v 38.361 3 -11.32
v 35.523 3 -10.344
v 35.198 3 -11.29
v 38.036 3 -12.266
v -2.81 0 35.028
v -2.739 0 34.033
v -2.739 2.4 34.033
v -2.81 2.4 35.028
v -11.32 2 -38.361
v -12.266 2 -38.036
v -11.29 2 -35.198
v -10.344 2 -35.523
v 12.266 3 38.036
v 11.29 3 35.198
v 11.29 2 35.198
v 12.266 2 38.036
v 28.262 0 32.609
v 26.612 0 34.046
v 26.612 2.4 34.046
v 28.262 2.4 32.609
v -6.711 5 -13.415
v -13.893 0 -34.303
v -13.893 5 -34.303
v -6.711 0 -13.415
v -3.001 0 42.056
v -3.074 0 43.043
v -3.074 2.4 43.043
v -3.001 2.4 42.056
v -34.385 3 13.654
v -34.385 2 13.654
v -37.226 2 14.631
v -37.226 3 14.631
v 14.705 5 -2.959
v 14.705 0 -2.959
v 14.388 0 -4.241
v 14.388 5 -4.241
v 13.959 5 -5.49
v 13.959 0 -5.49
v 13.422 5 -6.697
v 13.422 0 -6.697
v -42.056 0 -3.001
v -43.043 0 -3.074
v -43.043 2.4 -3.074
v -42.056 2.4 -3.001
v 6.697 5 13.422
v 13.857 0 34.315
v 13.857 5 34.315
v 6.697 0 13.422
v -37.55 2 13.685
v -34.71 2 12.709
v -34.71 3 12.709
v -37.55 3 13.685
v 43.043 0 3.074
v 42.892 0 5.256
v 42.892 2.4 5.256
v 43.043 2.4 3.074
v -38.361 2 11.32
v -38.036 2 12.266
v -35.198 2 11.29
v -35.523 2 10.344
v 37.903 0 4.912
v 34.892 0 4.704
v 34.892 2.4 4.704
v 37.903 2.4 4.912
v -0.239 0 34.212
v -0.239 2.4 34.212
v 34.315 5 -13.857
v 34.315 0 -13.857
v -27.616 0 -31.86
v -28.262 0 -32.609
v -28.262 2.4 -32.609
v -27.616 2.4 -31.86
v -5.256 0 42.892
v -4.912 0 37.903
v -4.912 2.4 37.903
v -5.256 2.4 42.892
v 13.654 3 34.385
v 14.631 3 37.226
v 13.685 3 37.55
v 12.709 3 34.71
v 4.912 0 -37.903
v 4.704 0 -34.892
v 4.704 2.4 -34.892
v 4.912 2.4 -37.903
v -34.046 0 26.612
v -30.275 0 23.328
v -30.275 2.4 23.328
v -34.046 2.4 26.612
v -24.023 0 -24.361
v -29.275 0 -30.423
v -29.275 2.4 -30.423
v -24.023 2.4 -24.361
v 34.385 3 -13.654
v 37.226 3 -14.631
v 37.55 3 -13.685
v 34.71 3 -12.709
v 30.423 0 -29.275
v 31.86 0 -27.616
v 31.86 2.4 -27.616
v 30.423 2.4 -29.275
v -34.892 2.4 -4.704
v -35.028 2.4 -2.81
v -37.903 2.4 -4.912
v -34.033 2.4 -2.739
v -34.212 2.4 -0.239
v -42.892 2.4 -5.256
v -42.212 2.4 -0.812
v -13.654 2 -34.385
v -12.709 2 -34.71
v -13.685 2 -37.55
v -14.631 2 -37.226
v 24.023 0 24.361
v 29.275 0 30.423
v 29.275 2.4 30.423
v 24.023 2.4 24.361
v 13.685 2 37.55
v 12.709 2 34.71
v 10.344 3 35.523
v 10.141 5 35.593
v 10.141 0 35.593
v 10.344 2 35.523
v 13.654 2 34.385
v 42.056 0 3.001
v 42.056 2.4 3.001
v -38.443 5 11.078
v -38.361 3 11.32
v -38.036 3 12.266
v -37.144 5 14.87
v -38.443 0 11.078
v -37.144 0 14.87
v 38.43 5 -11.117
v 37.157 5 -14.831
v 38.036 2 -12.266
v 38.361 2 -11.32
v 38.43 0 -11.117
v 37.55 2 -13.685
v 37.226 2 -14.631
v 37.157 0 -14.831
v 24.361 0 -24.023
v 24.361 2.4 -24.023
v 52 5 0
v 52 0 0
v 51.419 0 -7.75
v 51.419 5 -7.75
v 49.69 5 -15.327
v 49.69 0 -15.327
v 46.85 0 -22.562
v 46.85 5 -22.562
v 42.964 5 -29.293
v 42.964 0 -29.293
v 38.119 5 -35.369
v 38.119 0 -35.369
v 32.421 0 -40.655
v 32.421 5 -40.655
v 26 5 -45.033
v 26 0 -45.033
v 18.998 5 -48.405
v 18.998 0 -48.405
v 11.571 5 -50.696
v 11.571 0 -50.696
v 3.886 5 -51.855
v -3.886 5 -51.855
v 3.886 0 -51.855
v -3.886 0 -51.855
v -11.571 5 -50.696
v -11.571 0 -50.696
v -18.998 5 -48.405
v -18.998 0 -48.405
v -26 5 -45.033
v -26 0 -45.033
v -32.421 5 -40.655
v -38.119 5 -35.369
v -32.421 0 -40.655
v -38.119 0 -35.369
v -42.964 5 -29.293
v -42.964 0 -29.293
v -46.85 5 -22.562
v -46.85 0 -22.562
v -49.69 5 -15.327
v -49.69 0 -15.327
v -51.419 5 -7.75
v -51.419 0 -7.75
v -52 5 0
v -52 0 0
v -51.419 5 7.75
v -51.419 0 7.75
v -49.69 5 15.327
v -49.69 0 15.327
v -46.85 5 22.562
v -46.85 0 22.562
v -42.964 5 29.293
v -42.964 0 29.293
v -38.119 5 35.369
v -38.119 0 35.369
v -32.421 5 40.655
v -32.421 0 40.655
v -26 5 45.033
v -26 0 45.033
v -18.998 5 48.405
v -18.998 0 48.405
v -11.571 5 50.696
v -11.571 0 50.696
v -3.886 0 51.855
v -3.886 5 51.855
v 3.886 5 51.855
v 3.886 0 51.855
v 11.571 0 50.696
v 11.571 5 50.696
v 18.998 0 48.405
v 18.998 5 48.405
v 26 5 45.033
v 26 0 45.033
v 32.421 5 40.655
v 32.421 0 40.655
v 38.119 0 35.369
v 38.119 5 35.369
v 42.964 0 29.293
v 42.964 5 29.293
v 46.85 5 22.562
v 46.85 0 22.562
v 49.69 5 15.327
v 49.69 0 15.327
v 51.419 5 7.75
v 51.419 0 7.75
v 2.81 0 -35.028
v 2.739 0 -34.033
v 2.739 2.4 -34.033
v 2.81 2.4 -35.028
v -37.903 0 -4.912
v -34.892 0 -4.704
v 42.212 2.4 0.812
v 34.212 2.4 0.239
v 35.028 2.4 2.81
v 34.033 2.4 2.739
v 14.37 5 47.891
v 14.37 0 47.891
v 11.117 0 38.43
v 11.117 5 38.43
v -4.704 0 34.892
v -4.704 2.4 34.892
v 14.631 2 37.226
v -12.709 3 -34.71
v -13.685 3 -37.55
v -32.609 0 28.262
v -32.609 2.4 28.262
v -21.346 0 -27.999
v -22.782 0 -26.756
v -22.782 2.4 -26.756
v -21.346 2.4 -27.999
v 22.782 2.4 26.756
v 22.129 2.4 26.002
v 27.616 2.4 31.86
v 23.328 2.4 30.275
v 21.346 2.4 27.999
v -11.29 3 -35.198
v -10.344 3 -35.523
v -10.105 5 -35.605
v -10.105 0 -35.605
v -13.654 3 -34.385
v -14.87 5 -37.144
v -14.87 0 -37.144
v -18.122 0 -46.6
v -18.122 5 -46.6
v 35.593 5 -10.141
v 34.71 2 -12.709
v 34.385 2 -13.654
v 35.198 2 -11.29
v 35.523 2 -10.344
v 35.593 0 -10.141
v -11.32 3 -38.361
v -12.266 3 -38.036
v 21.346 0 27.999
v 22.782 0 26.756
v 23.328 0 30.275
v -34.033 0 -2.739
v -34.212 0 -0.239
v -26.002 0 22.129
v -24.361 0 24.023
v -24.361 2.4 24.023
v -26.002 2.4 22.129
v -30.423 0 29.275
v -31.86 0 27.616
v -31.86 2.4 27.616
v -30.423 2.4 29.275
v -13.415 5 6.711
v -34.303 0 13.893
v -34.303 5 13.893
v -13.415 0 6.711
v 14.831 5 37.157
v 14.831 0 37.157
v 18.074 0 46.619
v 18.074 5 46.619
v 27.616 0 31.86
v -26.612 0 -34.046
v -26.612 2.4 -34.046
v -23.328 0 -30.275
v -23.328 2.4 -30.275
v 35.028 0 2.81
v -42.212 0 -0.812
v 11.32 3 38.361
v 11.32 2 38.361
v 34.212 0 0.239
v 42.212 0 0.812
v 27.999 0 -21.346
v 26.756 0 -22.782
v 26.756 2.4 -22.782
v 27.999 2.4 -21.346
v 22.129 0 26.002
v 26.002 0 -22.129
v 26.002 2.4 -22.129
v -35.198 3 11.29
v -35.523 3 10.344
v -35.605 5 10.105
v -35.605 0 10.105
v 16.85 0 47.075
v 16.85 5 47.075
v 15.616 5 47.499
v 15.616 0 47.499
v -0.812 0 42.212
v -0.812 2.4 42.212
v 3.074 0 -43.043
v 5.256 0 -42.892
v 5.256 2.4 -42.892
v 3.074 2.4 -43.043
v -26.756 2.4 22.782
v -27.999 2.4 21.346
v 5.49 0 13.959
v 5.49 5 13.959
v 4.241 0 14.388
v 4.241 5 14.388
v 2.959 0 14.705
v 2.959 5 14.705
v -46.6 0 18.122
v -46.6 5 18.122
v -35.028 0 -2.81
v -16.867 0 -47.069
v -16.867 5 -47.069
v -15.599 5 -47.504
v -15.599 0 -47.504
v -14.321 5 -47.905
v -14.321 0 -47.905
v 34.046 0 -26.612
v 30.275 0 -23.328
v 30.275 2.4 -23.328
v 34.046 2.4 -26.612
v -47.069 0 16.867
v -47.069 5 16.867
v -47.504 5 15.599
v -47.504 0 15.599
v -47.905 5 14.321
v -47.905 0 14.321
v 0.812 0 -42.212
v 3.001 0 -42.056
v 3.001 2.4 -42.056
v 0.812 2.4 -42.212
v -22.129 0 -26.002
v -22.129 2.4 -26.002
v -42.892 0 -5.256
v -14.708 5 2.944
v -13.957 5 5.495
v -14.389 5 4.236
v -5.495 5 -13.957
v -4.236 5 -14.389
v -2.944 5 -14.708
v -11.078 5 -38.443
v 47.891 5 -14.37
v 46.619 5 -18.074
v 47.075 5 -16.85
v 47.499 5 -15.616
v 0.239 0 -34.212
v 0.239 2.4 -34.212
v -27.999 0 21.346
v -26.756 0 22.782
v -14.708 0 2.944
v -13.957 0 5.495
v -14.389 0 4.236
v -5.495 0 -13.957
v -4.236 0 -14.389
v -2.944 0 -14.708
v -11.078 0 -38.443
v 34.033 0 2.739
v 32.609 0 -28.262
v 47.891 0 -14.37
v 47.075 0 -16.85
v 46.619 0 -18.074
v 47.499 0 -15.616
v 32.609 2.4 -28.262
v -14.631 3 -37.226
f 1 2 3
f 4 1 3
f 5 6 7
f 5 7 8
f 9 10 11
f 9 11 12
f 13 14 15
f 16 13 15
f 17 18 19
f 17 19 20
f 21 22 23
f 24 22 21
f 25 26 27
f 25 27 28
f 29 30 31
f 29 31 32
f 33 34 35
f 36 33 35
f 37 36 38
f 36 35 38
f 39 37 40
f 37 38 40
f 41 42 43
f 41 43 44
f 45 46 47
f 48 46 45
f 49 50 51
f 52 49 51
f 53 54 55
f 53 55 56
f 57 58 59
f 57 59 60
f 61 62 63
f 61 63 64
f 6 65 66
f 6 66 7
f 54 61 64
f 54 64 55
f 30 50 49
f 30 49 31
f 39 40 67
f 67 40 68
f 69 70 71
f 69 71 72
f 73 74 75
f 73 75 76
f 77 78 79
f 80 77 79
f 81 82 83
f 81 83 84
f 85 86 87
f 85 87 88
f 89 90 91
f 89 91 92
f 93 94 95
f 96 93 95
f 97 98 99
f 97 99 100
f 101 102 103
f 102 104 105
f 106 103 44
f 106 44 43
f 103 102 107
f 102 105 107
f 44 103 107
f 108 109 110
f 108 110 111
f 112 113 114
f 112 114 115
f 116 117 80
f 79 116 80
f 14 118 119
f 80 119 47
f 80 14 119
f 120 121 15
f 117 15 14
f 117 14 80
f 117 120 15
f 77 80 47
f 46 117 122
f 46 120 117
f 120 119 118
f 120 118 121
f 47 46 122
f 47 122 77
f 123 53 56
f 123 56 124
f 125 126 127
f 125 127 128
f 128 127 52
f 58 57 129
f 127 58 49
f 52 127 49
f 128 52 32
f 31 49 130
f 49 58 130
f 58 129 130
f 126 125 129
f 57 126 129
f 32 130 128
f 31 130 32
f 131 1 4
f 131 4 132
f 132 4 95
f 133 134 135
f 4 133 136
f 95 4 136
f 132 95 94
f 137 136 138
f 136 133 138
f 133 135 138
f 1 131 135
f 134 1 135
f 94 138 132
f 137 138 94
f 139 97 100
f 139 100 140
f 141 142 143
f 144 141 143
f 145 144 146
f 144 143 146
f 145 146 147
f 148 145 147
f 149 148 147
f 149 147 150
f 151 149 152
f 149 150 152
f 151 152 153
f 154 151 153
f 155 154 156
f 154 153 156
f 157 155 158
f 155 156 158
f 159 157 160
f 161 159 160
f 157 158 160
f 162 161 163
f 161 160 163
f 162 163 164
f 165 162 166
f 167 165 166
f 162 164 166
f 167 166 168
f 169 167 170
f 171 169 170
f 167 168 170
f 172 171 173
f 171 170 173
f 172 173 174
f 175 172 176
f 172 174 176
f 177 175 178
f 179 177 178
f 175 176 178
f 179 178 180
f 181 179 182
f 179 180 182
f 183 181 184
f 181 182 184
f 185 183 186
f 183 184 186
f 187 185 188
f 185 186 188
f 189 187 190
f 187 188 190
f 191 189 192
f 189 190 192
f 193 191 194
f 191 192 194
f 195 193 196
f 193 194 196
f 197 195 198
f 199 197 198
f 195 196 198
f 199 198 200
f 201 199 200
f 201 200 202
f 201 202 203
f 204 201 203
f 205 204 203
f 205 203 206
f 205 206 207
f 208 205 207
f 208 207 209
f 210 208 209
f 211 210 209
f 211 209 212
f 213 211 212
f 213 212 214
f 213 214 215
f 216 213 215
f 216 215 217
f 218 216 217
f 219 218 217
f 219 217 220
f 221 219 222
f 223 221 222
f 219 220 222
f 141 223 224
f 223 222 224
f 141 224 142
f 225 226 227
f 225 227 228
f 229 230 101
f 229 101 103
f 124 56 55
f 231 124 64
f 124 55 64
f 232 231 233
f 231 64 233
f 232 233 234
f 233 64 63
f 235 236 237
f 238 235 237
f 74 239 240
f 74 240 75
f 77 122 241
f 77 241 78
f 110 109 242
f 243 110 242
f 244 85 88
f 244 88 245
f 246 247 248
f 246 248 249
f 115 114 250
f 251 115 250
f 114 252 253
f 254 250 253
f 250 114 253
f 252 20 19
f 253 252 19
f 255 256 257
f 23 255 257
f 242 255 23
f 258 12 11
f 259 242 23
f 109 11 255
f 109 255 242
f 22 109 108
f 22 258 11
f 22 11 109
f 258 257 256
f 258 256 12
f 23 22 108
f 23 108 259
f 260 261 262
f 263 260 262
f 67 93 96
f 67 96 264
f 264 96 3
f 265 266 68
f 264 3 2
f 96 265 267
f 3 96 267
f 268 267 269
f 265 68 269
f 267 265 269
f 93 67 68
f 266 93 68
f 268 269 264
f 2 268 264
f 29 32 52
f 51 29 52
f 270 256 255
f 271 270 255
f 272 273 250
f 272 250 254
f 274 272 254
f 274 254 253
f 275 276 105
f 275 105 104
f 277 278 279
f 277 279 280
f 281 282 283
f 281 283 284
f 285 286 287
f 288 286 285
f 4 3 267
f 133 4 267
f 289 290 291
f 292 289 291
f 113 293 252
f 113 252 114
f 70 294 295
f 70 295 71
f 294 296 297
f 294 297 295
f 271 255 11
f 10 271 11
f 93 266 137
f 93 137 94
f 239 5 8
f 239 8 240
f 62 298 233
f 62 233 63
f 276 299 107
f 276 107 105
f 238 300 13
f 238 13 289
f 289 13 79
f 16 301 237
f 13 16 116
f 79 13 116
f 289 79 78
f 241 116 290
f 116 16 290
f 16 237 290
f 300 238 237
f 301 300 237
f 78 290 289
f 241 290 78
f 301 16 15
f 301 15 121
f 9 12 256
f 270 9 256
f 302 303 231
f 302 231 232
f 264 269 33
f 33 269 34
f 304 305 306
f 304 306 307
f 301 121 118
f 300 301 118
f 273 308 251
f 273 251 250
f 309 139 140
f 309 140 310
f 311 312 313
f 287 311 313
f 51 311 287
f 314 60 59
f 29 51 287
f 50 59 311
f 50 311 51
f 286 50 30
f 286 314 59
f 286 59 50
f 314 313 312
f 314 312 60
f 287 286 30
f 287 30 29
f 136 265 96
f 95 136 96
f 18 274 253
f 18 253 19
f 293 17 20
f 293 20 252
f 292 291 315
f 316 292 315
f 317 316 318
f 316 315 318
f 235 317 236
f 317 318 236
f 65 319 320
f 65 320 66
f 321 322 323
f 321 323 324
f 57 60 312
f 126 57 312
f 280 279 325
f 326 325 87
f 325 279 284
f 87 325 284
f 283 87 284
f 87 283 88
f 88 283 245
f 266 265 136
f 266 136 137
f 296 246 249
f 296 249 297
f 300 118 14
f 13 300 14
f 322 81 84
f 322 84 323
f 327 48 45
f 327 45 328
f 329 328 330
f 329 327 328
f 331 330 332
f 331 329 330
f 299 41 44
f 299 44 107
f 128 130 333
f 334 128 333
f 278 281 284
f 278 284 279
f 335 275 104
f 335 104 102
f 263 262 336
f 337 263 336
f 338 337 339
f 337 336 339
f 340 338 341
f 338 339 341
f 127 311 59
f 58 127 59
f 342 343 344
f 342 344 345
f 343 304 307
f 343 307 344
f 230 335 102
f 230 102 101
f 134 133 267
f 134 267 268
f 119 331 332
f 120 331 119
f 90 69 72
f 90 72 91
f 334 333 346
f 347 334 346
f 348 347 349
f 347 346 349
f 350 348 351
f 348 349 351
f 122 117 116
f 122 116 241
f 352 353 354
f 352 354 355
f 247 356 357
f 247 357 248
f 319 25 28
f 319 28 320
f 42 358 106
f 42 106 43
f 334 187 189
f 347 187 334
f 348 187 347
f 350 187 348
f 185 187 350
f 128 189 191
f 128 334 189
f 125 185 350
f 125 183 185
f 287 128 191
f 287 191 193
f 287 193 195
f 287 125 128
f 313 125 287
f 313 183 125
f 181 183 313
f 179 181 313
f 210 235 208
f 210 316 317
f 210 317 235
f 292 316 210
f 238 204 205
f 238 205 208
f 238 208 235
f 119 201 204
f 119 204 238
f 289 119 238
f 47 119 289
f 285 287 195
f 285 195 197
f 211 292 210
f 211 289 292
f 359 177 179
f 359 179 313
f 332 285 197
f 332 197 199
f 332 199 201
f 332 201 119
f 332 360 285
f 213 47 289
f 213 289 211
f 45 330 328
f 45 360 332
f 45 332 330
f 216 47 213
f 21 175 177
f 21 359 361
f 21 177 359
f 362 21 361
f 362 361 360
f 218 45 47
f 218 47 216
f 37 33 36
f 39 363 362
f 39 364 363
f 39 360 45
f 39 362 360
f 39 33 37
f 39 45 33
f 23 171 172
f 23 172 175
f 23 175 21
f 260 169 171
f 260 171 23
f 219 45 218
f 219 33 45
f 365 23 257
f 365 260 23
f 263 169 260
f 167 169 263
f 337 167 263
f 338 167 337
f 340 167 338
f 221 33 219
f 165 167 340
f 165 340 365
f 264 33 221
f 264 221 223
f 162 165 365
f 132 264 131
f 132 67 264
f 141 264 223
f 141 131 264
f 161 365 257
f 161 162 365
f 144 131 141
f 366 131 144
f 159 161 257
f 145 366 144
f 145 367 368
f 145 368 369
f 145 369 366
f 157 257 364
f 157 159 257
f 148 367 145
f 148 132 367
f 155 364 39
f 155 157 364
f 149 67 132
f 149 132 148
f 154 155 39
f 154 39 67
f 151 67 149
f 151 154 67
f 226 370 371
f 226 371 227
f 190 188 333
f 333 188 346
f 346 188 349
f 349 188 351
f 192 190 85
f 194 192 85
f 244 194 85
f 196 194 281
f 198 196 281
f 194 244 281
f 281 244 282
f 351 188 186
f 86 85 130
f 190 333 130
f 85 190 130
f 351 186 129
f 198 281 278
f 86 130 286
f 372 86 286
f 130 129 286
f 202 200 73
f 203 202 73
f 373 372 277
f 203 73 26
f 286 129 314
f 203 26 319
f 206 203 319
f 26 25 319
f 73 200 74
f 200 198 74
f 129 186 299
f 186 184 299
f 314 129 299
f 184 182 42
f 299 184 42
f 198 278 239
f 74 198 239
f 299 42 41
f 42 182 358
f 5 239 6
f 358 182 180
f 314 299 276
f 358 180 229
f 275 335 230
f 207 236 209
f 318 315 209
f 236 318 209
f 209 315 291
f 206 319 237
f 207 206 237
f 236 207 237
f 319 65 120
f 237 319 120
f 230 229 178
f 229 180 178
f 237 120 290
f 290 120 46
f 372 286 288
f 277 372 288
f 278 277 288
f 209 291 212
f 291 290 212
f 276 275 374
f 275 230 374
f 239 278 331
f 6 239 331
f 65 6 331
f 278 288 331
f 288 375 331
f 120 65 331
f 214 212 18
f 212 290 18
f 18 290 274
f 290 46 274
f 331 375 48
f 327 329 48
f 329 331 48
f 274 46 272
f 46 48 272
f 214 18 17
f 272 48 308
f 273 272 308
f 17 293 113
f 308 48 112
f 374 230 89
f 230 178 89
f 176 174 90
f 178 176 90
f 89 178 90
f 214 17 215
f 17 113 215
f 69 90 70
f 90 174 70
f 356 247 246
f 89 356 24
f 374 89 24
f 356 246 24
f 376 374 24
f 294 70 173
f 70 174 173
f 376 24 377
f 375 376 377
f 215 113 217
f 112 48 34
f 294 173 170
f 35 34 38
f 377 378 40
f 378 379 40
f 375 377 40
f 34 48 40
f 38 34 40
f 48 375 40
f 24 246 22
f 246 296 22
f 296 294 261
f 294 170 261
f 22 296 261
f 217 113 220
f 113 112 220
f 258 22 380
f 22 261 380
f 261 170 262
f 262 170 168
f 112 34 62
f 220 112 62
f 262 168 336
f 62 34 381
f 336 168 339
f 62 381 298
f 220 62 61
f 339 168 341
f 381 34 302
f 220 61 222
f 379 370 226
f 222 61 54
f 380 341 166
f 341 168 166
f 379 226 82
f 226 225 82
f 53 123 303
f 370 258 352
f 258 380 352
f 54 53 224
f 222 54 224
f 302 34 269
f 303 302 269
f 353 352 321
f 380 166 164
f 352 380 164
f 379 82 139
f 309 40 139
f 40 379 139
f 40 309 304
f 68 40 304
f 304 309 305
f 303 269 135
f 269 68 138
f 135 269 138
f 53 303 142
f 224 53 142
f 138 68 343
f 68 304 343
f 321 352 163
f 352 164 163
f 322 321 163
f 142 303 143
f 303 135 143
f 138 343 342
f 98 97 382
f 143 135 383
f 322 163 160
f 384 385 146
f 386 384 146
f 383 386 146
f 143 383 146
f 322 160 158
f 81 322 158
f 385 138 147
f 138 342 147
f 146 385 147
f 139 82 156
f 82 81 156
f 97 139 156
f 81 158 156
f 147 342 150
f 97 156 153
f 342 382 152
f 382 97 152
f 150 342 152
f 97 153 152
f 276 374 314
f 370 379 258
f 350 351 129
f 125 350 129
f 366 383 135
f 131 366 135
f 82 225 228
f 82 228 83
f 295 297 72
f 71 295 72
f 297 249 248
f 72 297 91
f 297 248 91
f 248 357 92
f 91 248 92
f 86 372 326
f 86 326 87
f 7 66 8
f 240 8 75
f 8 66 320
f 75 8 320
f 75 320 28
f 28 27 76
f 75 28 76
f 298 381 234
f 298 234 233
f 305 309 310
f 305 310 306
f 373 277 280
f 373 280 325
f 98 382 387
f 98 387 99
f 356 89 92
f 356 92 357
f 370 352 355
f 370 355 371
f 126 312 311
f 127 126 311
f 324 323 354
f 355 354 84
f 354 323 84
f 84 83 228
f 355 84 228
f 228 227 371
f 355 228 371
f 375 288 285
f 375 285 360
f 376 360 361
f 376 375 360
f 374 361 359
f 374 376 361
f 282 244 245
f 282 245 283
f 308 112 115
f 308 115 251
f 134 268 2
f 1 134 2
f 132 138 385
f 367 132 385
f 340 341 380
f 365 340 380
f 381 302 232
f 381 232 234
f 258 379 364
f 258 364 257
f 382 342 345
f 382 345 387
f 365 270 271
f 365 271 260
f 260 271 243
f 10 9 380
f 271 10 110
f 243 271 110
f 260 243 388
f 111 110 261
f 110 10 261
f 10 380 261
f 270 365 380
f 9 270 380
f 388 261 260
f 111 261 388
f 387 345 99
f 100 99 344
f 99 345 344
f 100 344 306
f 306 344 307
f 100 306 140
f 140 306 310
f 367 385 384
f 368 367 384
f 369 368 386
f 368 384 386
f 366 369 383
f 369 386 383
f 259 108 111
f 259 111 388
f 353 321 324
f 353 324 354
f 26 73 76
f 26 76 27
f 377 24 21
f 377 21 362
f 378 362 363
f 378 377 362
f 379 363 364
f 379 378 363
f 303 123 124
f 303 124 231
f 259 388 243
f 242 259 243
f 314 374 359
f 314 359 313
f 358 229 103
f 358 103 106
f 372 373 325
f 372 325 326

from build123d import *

# Parameters (mm, degrees)
SKETCH1_R           = 52
BOSS_EXTRUDE1_DEPTH = 5
CUT_EXTRUDE3_DEPTH  = 2.4
CUT_EXTRUDE6_DEPTH  = 5
CUT_EXTRUDE7_DEPTH  = 5
CIRPATTERN1_COUNT   = 4


with BuildPart() as part:
    # Sketch1 → Boss-Extrude1 (new body)
    with BuildSketch(Plane(origin=(0, 0, 0), x_dir=(1, 0, 0), z_dir=(0, 1, 0))):
        Circle(SKETCH1_R)
    extrude(amount=BOSS_EXTRUDE1_DEPTH)

    # Sketch4 → Cut-Extrude3 (cut)
    with BuildSketch(Plane.XZ):
        Polygon((-30.27517129, 23.328400706), (-34.046075388, 26.612474905), (-32.609483493, 28.262026633), (-31.859987156, 27.61559837), (-30.422563818, 29.274773748), (-24.360613821, 24.023015245), (-26.001788353, 22.128655871), (-26.755565092, 22.781688872), (-27.999168756, 21.346233829), align=None)
        Polygon((-37.903449254, -4.912108587), (-42.892072249, -5.256349311), (-43.042657591, -3.074116227), (-42.05558984, -3.001236093), (-42.212392211, -0.811610142), (-34.212392211, -0.238718243), (-34.033363493, -2.738718243), (-35.028128199, -2.809954823), (-34.892468788, -4.704335401), align=None)
        Polygon((-4.912108587, 37.903449254), (-5.256349311, 42.892072249), (-3.074116227, 43.042657591), (-3.001236093, 42.05558984), (-0.811610142, 42.212392211), (-0.238718243, 34.212392211), (-2.738718243, 34.033363493), (-2.809954823, 35.028128199), (-4.704335401, 34.892468788), align=None)
        Polygon((23.328400706, 30.27517129), (26.612474905, 34.046075388), (28.262026633, 32.609483493), (27.61559837, 31.859987156), (29.274773748, 30.422563818), (24.023015245, 24.360613821), (22.128655871, 26.001788353), (22.781688872, 26.755565092), (21.346233829, 27.999168756), align=None)
        Polygon((37.903449254, 4.912108587), (42.892072249, 5.256349311), (43.042657591, 3.074116227), (42.05558984, 3.001236093), (42.212392211, 0.811610142), (34.212392211, 0.238718243), (34.033363493, 2.738718243), (35.028128199, 2.809954823), (34.892468788, 4.704335401), align=None)
        Polygon((30.27517129, -23.328400706), (34.046075388, -26.612474905), (32.609483493, -28.262026633), (31.859987156, -27.61559837), (30.422563818, -29.274773748), (24.360613821, -24.023015245), (26.001788353, -22.128655871), (26.755565092, -22.781688872), (27.999168756, -21.346233829), align=None)
        Polygon((4.912108587, -37.903449254), (5.256349311, -42.892072249), (3.074116227, -43.042657591), (3.001236093, -42.05558984), (0.811610142, -42.212392211), (0.238718243, -34.212392211), (2.738718243, -34.033363493), (2.809954823, -35.028128199), (4.704335401, -34.892468788), align=None)
        Polygon((-23.328400706, -30.27517129), (-26.612474905, -34.046075388), (-28.262026633, -32.609483493), (-27.61559837, -31.859987156), (-29.274773748, -30.422563818), (-24.023015245, -24.360613821), (-22.128655871, -26.001788353), (-22.781688872, -26.755565092), (-21.346233829, -27.999168756), align=None)
    extrude(amount=-CUT_EXTRUDE3_DEPTH, mode=Mode.SUBTRACT)

    # Sketch8 → Cut-Extrude6 (cut)
    with BuildSketch(Plane.XZ):
        with BuildLine():
            Line((-47.90528304, 14.320749174), (-38.443448295, 11.078076484))
            Line((-38.443448295, 11.078076484), (-37.143919852, 14.869986599))
            Line((-37.143919852, 14.869986599), (-46.600463643, 18.121721449))
            ThreePointArc((-46.600463643, 18.121721449), (-47.291076183, 16.2343498), (-47.90528304, 14.320749174))
        make_face()
        with BuildLine():
            Line((2.958916284, 14.705264854), (10.141430922, 35.593119285))
            Line((10.141430922, 35.593119285), (13.857171973, 34.31542154))
            Line((13.857171973, 34.31542154), (6.696805901, 13.422100831))
            ThreePointArc((6.696805901, 13.422100831), (4.87030494, 14.187322855), (2.958916284, 14.705264854))
        make_face()
        with BuildLine():
            Line((13.422100831, -6.696805901), (34.31542154, -13.857171973))
            Line((34.31542154, -13.857171973), (35.593119285, -10.141430922))
            Line((35.593119285, -10.141430922), (14.705264854, -2.958916284))
            ThreePointArc((14.705264854, -2.958916284), (14.187322855, -4.87030494), (13.422100831, -6.696805901))
        make_face()
        with BuildLine():
            Line((-13.893125689, -34.303058466), (-6.710611051, -13.415204036))
            ThreePointArc((-6.710611051, -13.415204036), (-4.87030494, -14.187322855), (-2.943785902, -14.708301213))
            Line((-2.943785902, -14.708301213), (-10.10547522, -35.605483041))
            Line((-10.10547522, -35.605483041), (-13.893125689, -34.303058466))
        make_face()
        with BuildLine():
            Line((-14.320749174, -47.90528304), (-11.078076484, -38.443448295))
            Line((-11.078076484, -38.443448295), (-14.869986599, -37.143919852))
            Line((-14.869986599, -37.143919852), (-18.121721449, -46.600463643))
            ThreePointArc((-18.121721449, -46.600463643), (-16.2343498, -47.291076183), (-14.320749174, -47.90528304))
        make_face()
        with BuildLine():
            Line((-35.605483041, 10.10547522), (-34.303058466, 13.893125689))
            Line((-34.303058466, 13.893125689), (-13.415204036, 6.710611051))
            ThreePointArc((-13.415204036, 6.710611051), (-14.187322855, 4.87030494), (-14.708301213, 2.943785902))
            Line((-14.708301213, 2.943785902), (-35.605483041, 10.10547522))
        make_face()
        with BuildLine():
            Line((11.116964613, 38.430120915), (14.831096483, 37.157247914))
            Line((14.831096483, 37.157247914), (18.073769174, 46.619082658))
            ThreePointArc((18.073769174, 46.619082658), (16.2343498, 47.291076183), (14.370026682, 47.890524461))
            Line((14.370026682, 47.890524461), (11.116964613, 38.430120915))
        make_face()
        with BuildLine():
            Line((38.430120915, -11.116964613), (37.157247914, -14.831096483))
            Line((37.157247914, -14.831096483), (46.619082658, -18.073769174))
            ThreePointArc((46.619082658, -18.073769174), (47.291076183, -16.2343498), (47.890524461, -14.370026682))
            Line((47.890524461, -14.370026682), (38.430120915, -11.116964613))
        make_face()
    extrude(amount=-CUT_EXTRUDE6_DEPTH, mode=Mode.SUBTRACT)

    # Sketch9 → Cut-Extrude7 (cut)
    with BuildSketch(Plane(origin=(34.948088876, 0, -12.017278305), x_dir=(0.325173485, 0, 0.945654379), z_dir=(-0.945654379, 0, 0.325173485))):
        Polygon((0.769009966, 2.5), (0.769009966, 2), (1.769009966, 2), (1.769009966, 3), (0.769009966, 3), align=None)
        Polygon((-0.730990034, 2.5), (-0.730990034, 2), (-1.730990034, 2), (-1.730990034, 3), (-0.730990034, 3), align=None)
    cut_extrude7 = extrude(amount=-CUT_EXTRUDE7_DEPTH, mode=Mode.SUBTRACT)

    # CirPattern1: Cut-Extrude7 ×4 about axis
    cirpattern1_axis = Axis((0, 0, 0), (0, 1, 0))
    for i in range(1, CIRPATTERN1_COUNT):
        add(cut_extrude7.rotate(cirpattern1_axis, i * 360 / CIRPATTERN1_COUNT), mode=Mode.SUBTRACT)


solid = part.part
